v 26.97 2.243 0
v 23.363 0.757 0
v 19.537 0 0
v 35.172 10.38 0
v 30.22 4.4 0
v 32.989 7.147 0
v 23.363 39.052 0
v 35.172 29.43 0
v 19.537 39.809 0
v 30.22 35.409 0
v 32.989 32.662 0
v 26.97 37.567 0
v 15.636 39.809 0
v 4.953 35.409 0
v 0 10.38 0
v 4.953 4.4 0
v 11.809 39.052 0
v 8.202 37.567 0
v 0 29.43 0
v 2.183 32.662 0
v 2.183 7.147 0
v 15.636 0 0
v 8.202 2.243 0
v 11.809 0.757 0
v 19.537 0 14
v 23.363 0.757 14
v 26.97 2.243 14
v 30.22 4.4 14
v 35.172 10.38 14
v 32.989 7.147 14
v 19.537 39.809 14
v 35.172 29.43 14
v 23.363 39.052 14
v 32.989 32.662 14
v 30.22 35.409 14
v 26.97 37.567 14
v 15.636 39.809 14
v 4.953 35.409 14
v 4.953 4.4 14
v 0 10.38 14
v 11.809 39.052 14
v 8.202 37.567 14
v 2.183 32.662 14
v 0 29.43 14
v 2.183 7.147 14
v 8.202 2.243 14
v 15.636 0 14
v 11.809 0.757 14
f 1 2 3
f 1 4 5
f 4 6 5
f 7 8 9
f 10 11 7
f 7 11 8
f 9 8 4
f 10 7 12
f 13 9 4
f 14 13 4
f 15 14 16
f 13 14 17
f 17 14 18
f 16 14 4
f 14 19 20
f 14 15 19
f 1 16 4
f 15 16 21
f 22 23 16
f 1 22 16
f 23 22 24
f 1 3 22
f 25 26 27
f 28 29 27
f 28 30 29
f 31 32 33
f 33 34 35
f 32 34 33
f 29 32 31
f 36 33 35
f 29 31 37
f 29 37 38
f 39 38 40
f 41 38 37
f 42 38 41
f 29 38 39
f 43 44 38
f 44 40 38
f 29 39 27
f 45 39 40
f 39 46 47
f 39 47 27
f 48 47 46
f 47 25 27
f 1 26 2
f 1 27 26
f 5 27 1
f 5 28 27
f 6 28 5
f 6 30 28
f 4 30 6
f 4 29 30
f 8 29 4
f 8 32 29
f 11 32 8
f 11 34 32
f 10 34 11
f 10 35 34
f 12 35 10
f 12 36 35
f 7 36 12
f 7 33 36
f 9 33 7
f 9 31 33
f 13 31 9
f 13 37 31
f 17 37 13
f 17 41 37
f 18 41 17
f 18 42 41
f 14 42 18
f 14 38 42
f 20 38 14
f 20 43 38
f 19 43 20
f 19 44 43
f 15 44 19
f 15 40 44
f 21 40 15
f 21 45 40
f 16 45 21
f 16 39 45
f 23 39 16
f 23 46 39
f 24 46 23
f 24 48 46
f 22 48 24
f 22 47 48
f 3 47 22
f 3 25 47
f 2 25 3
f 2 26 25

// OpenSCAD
$fn = 32;

// ----------------------------------------------------------------------
// Flat adaptor: double_d, 14 mm thick
// ----------------------------------------------------------------------

// --- parameters (mm) ---
profile_height = 14;      // extrusion height
profile_points = 24;      // points of the closed outline

profile = [[35.172, 29.43], [32.989, 32.662], [30.22, 35.409], [26.97, 37.567], [23.363, 39.052], [19.537, 39.809], [15.636, 39.809], [11.809, 39.052], [8.202, 37.567], [4.953, 35.409], [2.183, 32.662], [0, 29.43], [0, 10.38], [2.183, 7.147], [4.953, 4.4], [8.202, 2.243], [11.809, 0.757], [15.636, 0], [19.537, 0], [23.363, 0.757], [26.97, 2.243], [30.22, 4.4], [32.989, 7.147], [35.172, 10.38]];  // single closed polygon, 24 points, counter clockwise

// --- the one profile operation ---
linear_extrude(height = profile_height) polygon(points = profile);
